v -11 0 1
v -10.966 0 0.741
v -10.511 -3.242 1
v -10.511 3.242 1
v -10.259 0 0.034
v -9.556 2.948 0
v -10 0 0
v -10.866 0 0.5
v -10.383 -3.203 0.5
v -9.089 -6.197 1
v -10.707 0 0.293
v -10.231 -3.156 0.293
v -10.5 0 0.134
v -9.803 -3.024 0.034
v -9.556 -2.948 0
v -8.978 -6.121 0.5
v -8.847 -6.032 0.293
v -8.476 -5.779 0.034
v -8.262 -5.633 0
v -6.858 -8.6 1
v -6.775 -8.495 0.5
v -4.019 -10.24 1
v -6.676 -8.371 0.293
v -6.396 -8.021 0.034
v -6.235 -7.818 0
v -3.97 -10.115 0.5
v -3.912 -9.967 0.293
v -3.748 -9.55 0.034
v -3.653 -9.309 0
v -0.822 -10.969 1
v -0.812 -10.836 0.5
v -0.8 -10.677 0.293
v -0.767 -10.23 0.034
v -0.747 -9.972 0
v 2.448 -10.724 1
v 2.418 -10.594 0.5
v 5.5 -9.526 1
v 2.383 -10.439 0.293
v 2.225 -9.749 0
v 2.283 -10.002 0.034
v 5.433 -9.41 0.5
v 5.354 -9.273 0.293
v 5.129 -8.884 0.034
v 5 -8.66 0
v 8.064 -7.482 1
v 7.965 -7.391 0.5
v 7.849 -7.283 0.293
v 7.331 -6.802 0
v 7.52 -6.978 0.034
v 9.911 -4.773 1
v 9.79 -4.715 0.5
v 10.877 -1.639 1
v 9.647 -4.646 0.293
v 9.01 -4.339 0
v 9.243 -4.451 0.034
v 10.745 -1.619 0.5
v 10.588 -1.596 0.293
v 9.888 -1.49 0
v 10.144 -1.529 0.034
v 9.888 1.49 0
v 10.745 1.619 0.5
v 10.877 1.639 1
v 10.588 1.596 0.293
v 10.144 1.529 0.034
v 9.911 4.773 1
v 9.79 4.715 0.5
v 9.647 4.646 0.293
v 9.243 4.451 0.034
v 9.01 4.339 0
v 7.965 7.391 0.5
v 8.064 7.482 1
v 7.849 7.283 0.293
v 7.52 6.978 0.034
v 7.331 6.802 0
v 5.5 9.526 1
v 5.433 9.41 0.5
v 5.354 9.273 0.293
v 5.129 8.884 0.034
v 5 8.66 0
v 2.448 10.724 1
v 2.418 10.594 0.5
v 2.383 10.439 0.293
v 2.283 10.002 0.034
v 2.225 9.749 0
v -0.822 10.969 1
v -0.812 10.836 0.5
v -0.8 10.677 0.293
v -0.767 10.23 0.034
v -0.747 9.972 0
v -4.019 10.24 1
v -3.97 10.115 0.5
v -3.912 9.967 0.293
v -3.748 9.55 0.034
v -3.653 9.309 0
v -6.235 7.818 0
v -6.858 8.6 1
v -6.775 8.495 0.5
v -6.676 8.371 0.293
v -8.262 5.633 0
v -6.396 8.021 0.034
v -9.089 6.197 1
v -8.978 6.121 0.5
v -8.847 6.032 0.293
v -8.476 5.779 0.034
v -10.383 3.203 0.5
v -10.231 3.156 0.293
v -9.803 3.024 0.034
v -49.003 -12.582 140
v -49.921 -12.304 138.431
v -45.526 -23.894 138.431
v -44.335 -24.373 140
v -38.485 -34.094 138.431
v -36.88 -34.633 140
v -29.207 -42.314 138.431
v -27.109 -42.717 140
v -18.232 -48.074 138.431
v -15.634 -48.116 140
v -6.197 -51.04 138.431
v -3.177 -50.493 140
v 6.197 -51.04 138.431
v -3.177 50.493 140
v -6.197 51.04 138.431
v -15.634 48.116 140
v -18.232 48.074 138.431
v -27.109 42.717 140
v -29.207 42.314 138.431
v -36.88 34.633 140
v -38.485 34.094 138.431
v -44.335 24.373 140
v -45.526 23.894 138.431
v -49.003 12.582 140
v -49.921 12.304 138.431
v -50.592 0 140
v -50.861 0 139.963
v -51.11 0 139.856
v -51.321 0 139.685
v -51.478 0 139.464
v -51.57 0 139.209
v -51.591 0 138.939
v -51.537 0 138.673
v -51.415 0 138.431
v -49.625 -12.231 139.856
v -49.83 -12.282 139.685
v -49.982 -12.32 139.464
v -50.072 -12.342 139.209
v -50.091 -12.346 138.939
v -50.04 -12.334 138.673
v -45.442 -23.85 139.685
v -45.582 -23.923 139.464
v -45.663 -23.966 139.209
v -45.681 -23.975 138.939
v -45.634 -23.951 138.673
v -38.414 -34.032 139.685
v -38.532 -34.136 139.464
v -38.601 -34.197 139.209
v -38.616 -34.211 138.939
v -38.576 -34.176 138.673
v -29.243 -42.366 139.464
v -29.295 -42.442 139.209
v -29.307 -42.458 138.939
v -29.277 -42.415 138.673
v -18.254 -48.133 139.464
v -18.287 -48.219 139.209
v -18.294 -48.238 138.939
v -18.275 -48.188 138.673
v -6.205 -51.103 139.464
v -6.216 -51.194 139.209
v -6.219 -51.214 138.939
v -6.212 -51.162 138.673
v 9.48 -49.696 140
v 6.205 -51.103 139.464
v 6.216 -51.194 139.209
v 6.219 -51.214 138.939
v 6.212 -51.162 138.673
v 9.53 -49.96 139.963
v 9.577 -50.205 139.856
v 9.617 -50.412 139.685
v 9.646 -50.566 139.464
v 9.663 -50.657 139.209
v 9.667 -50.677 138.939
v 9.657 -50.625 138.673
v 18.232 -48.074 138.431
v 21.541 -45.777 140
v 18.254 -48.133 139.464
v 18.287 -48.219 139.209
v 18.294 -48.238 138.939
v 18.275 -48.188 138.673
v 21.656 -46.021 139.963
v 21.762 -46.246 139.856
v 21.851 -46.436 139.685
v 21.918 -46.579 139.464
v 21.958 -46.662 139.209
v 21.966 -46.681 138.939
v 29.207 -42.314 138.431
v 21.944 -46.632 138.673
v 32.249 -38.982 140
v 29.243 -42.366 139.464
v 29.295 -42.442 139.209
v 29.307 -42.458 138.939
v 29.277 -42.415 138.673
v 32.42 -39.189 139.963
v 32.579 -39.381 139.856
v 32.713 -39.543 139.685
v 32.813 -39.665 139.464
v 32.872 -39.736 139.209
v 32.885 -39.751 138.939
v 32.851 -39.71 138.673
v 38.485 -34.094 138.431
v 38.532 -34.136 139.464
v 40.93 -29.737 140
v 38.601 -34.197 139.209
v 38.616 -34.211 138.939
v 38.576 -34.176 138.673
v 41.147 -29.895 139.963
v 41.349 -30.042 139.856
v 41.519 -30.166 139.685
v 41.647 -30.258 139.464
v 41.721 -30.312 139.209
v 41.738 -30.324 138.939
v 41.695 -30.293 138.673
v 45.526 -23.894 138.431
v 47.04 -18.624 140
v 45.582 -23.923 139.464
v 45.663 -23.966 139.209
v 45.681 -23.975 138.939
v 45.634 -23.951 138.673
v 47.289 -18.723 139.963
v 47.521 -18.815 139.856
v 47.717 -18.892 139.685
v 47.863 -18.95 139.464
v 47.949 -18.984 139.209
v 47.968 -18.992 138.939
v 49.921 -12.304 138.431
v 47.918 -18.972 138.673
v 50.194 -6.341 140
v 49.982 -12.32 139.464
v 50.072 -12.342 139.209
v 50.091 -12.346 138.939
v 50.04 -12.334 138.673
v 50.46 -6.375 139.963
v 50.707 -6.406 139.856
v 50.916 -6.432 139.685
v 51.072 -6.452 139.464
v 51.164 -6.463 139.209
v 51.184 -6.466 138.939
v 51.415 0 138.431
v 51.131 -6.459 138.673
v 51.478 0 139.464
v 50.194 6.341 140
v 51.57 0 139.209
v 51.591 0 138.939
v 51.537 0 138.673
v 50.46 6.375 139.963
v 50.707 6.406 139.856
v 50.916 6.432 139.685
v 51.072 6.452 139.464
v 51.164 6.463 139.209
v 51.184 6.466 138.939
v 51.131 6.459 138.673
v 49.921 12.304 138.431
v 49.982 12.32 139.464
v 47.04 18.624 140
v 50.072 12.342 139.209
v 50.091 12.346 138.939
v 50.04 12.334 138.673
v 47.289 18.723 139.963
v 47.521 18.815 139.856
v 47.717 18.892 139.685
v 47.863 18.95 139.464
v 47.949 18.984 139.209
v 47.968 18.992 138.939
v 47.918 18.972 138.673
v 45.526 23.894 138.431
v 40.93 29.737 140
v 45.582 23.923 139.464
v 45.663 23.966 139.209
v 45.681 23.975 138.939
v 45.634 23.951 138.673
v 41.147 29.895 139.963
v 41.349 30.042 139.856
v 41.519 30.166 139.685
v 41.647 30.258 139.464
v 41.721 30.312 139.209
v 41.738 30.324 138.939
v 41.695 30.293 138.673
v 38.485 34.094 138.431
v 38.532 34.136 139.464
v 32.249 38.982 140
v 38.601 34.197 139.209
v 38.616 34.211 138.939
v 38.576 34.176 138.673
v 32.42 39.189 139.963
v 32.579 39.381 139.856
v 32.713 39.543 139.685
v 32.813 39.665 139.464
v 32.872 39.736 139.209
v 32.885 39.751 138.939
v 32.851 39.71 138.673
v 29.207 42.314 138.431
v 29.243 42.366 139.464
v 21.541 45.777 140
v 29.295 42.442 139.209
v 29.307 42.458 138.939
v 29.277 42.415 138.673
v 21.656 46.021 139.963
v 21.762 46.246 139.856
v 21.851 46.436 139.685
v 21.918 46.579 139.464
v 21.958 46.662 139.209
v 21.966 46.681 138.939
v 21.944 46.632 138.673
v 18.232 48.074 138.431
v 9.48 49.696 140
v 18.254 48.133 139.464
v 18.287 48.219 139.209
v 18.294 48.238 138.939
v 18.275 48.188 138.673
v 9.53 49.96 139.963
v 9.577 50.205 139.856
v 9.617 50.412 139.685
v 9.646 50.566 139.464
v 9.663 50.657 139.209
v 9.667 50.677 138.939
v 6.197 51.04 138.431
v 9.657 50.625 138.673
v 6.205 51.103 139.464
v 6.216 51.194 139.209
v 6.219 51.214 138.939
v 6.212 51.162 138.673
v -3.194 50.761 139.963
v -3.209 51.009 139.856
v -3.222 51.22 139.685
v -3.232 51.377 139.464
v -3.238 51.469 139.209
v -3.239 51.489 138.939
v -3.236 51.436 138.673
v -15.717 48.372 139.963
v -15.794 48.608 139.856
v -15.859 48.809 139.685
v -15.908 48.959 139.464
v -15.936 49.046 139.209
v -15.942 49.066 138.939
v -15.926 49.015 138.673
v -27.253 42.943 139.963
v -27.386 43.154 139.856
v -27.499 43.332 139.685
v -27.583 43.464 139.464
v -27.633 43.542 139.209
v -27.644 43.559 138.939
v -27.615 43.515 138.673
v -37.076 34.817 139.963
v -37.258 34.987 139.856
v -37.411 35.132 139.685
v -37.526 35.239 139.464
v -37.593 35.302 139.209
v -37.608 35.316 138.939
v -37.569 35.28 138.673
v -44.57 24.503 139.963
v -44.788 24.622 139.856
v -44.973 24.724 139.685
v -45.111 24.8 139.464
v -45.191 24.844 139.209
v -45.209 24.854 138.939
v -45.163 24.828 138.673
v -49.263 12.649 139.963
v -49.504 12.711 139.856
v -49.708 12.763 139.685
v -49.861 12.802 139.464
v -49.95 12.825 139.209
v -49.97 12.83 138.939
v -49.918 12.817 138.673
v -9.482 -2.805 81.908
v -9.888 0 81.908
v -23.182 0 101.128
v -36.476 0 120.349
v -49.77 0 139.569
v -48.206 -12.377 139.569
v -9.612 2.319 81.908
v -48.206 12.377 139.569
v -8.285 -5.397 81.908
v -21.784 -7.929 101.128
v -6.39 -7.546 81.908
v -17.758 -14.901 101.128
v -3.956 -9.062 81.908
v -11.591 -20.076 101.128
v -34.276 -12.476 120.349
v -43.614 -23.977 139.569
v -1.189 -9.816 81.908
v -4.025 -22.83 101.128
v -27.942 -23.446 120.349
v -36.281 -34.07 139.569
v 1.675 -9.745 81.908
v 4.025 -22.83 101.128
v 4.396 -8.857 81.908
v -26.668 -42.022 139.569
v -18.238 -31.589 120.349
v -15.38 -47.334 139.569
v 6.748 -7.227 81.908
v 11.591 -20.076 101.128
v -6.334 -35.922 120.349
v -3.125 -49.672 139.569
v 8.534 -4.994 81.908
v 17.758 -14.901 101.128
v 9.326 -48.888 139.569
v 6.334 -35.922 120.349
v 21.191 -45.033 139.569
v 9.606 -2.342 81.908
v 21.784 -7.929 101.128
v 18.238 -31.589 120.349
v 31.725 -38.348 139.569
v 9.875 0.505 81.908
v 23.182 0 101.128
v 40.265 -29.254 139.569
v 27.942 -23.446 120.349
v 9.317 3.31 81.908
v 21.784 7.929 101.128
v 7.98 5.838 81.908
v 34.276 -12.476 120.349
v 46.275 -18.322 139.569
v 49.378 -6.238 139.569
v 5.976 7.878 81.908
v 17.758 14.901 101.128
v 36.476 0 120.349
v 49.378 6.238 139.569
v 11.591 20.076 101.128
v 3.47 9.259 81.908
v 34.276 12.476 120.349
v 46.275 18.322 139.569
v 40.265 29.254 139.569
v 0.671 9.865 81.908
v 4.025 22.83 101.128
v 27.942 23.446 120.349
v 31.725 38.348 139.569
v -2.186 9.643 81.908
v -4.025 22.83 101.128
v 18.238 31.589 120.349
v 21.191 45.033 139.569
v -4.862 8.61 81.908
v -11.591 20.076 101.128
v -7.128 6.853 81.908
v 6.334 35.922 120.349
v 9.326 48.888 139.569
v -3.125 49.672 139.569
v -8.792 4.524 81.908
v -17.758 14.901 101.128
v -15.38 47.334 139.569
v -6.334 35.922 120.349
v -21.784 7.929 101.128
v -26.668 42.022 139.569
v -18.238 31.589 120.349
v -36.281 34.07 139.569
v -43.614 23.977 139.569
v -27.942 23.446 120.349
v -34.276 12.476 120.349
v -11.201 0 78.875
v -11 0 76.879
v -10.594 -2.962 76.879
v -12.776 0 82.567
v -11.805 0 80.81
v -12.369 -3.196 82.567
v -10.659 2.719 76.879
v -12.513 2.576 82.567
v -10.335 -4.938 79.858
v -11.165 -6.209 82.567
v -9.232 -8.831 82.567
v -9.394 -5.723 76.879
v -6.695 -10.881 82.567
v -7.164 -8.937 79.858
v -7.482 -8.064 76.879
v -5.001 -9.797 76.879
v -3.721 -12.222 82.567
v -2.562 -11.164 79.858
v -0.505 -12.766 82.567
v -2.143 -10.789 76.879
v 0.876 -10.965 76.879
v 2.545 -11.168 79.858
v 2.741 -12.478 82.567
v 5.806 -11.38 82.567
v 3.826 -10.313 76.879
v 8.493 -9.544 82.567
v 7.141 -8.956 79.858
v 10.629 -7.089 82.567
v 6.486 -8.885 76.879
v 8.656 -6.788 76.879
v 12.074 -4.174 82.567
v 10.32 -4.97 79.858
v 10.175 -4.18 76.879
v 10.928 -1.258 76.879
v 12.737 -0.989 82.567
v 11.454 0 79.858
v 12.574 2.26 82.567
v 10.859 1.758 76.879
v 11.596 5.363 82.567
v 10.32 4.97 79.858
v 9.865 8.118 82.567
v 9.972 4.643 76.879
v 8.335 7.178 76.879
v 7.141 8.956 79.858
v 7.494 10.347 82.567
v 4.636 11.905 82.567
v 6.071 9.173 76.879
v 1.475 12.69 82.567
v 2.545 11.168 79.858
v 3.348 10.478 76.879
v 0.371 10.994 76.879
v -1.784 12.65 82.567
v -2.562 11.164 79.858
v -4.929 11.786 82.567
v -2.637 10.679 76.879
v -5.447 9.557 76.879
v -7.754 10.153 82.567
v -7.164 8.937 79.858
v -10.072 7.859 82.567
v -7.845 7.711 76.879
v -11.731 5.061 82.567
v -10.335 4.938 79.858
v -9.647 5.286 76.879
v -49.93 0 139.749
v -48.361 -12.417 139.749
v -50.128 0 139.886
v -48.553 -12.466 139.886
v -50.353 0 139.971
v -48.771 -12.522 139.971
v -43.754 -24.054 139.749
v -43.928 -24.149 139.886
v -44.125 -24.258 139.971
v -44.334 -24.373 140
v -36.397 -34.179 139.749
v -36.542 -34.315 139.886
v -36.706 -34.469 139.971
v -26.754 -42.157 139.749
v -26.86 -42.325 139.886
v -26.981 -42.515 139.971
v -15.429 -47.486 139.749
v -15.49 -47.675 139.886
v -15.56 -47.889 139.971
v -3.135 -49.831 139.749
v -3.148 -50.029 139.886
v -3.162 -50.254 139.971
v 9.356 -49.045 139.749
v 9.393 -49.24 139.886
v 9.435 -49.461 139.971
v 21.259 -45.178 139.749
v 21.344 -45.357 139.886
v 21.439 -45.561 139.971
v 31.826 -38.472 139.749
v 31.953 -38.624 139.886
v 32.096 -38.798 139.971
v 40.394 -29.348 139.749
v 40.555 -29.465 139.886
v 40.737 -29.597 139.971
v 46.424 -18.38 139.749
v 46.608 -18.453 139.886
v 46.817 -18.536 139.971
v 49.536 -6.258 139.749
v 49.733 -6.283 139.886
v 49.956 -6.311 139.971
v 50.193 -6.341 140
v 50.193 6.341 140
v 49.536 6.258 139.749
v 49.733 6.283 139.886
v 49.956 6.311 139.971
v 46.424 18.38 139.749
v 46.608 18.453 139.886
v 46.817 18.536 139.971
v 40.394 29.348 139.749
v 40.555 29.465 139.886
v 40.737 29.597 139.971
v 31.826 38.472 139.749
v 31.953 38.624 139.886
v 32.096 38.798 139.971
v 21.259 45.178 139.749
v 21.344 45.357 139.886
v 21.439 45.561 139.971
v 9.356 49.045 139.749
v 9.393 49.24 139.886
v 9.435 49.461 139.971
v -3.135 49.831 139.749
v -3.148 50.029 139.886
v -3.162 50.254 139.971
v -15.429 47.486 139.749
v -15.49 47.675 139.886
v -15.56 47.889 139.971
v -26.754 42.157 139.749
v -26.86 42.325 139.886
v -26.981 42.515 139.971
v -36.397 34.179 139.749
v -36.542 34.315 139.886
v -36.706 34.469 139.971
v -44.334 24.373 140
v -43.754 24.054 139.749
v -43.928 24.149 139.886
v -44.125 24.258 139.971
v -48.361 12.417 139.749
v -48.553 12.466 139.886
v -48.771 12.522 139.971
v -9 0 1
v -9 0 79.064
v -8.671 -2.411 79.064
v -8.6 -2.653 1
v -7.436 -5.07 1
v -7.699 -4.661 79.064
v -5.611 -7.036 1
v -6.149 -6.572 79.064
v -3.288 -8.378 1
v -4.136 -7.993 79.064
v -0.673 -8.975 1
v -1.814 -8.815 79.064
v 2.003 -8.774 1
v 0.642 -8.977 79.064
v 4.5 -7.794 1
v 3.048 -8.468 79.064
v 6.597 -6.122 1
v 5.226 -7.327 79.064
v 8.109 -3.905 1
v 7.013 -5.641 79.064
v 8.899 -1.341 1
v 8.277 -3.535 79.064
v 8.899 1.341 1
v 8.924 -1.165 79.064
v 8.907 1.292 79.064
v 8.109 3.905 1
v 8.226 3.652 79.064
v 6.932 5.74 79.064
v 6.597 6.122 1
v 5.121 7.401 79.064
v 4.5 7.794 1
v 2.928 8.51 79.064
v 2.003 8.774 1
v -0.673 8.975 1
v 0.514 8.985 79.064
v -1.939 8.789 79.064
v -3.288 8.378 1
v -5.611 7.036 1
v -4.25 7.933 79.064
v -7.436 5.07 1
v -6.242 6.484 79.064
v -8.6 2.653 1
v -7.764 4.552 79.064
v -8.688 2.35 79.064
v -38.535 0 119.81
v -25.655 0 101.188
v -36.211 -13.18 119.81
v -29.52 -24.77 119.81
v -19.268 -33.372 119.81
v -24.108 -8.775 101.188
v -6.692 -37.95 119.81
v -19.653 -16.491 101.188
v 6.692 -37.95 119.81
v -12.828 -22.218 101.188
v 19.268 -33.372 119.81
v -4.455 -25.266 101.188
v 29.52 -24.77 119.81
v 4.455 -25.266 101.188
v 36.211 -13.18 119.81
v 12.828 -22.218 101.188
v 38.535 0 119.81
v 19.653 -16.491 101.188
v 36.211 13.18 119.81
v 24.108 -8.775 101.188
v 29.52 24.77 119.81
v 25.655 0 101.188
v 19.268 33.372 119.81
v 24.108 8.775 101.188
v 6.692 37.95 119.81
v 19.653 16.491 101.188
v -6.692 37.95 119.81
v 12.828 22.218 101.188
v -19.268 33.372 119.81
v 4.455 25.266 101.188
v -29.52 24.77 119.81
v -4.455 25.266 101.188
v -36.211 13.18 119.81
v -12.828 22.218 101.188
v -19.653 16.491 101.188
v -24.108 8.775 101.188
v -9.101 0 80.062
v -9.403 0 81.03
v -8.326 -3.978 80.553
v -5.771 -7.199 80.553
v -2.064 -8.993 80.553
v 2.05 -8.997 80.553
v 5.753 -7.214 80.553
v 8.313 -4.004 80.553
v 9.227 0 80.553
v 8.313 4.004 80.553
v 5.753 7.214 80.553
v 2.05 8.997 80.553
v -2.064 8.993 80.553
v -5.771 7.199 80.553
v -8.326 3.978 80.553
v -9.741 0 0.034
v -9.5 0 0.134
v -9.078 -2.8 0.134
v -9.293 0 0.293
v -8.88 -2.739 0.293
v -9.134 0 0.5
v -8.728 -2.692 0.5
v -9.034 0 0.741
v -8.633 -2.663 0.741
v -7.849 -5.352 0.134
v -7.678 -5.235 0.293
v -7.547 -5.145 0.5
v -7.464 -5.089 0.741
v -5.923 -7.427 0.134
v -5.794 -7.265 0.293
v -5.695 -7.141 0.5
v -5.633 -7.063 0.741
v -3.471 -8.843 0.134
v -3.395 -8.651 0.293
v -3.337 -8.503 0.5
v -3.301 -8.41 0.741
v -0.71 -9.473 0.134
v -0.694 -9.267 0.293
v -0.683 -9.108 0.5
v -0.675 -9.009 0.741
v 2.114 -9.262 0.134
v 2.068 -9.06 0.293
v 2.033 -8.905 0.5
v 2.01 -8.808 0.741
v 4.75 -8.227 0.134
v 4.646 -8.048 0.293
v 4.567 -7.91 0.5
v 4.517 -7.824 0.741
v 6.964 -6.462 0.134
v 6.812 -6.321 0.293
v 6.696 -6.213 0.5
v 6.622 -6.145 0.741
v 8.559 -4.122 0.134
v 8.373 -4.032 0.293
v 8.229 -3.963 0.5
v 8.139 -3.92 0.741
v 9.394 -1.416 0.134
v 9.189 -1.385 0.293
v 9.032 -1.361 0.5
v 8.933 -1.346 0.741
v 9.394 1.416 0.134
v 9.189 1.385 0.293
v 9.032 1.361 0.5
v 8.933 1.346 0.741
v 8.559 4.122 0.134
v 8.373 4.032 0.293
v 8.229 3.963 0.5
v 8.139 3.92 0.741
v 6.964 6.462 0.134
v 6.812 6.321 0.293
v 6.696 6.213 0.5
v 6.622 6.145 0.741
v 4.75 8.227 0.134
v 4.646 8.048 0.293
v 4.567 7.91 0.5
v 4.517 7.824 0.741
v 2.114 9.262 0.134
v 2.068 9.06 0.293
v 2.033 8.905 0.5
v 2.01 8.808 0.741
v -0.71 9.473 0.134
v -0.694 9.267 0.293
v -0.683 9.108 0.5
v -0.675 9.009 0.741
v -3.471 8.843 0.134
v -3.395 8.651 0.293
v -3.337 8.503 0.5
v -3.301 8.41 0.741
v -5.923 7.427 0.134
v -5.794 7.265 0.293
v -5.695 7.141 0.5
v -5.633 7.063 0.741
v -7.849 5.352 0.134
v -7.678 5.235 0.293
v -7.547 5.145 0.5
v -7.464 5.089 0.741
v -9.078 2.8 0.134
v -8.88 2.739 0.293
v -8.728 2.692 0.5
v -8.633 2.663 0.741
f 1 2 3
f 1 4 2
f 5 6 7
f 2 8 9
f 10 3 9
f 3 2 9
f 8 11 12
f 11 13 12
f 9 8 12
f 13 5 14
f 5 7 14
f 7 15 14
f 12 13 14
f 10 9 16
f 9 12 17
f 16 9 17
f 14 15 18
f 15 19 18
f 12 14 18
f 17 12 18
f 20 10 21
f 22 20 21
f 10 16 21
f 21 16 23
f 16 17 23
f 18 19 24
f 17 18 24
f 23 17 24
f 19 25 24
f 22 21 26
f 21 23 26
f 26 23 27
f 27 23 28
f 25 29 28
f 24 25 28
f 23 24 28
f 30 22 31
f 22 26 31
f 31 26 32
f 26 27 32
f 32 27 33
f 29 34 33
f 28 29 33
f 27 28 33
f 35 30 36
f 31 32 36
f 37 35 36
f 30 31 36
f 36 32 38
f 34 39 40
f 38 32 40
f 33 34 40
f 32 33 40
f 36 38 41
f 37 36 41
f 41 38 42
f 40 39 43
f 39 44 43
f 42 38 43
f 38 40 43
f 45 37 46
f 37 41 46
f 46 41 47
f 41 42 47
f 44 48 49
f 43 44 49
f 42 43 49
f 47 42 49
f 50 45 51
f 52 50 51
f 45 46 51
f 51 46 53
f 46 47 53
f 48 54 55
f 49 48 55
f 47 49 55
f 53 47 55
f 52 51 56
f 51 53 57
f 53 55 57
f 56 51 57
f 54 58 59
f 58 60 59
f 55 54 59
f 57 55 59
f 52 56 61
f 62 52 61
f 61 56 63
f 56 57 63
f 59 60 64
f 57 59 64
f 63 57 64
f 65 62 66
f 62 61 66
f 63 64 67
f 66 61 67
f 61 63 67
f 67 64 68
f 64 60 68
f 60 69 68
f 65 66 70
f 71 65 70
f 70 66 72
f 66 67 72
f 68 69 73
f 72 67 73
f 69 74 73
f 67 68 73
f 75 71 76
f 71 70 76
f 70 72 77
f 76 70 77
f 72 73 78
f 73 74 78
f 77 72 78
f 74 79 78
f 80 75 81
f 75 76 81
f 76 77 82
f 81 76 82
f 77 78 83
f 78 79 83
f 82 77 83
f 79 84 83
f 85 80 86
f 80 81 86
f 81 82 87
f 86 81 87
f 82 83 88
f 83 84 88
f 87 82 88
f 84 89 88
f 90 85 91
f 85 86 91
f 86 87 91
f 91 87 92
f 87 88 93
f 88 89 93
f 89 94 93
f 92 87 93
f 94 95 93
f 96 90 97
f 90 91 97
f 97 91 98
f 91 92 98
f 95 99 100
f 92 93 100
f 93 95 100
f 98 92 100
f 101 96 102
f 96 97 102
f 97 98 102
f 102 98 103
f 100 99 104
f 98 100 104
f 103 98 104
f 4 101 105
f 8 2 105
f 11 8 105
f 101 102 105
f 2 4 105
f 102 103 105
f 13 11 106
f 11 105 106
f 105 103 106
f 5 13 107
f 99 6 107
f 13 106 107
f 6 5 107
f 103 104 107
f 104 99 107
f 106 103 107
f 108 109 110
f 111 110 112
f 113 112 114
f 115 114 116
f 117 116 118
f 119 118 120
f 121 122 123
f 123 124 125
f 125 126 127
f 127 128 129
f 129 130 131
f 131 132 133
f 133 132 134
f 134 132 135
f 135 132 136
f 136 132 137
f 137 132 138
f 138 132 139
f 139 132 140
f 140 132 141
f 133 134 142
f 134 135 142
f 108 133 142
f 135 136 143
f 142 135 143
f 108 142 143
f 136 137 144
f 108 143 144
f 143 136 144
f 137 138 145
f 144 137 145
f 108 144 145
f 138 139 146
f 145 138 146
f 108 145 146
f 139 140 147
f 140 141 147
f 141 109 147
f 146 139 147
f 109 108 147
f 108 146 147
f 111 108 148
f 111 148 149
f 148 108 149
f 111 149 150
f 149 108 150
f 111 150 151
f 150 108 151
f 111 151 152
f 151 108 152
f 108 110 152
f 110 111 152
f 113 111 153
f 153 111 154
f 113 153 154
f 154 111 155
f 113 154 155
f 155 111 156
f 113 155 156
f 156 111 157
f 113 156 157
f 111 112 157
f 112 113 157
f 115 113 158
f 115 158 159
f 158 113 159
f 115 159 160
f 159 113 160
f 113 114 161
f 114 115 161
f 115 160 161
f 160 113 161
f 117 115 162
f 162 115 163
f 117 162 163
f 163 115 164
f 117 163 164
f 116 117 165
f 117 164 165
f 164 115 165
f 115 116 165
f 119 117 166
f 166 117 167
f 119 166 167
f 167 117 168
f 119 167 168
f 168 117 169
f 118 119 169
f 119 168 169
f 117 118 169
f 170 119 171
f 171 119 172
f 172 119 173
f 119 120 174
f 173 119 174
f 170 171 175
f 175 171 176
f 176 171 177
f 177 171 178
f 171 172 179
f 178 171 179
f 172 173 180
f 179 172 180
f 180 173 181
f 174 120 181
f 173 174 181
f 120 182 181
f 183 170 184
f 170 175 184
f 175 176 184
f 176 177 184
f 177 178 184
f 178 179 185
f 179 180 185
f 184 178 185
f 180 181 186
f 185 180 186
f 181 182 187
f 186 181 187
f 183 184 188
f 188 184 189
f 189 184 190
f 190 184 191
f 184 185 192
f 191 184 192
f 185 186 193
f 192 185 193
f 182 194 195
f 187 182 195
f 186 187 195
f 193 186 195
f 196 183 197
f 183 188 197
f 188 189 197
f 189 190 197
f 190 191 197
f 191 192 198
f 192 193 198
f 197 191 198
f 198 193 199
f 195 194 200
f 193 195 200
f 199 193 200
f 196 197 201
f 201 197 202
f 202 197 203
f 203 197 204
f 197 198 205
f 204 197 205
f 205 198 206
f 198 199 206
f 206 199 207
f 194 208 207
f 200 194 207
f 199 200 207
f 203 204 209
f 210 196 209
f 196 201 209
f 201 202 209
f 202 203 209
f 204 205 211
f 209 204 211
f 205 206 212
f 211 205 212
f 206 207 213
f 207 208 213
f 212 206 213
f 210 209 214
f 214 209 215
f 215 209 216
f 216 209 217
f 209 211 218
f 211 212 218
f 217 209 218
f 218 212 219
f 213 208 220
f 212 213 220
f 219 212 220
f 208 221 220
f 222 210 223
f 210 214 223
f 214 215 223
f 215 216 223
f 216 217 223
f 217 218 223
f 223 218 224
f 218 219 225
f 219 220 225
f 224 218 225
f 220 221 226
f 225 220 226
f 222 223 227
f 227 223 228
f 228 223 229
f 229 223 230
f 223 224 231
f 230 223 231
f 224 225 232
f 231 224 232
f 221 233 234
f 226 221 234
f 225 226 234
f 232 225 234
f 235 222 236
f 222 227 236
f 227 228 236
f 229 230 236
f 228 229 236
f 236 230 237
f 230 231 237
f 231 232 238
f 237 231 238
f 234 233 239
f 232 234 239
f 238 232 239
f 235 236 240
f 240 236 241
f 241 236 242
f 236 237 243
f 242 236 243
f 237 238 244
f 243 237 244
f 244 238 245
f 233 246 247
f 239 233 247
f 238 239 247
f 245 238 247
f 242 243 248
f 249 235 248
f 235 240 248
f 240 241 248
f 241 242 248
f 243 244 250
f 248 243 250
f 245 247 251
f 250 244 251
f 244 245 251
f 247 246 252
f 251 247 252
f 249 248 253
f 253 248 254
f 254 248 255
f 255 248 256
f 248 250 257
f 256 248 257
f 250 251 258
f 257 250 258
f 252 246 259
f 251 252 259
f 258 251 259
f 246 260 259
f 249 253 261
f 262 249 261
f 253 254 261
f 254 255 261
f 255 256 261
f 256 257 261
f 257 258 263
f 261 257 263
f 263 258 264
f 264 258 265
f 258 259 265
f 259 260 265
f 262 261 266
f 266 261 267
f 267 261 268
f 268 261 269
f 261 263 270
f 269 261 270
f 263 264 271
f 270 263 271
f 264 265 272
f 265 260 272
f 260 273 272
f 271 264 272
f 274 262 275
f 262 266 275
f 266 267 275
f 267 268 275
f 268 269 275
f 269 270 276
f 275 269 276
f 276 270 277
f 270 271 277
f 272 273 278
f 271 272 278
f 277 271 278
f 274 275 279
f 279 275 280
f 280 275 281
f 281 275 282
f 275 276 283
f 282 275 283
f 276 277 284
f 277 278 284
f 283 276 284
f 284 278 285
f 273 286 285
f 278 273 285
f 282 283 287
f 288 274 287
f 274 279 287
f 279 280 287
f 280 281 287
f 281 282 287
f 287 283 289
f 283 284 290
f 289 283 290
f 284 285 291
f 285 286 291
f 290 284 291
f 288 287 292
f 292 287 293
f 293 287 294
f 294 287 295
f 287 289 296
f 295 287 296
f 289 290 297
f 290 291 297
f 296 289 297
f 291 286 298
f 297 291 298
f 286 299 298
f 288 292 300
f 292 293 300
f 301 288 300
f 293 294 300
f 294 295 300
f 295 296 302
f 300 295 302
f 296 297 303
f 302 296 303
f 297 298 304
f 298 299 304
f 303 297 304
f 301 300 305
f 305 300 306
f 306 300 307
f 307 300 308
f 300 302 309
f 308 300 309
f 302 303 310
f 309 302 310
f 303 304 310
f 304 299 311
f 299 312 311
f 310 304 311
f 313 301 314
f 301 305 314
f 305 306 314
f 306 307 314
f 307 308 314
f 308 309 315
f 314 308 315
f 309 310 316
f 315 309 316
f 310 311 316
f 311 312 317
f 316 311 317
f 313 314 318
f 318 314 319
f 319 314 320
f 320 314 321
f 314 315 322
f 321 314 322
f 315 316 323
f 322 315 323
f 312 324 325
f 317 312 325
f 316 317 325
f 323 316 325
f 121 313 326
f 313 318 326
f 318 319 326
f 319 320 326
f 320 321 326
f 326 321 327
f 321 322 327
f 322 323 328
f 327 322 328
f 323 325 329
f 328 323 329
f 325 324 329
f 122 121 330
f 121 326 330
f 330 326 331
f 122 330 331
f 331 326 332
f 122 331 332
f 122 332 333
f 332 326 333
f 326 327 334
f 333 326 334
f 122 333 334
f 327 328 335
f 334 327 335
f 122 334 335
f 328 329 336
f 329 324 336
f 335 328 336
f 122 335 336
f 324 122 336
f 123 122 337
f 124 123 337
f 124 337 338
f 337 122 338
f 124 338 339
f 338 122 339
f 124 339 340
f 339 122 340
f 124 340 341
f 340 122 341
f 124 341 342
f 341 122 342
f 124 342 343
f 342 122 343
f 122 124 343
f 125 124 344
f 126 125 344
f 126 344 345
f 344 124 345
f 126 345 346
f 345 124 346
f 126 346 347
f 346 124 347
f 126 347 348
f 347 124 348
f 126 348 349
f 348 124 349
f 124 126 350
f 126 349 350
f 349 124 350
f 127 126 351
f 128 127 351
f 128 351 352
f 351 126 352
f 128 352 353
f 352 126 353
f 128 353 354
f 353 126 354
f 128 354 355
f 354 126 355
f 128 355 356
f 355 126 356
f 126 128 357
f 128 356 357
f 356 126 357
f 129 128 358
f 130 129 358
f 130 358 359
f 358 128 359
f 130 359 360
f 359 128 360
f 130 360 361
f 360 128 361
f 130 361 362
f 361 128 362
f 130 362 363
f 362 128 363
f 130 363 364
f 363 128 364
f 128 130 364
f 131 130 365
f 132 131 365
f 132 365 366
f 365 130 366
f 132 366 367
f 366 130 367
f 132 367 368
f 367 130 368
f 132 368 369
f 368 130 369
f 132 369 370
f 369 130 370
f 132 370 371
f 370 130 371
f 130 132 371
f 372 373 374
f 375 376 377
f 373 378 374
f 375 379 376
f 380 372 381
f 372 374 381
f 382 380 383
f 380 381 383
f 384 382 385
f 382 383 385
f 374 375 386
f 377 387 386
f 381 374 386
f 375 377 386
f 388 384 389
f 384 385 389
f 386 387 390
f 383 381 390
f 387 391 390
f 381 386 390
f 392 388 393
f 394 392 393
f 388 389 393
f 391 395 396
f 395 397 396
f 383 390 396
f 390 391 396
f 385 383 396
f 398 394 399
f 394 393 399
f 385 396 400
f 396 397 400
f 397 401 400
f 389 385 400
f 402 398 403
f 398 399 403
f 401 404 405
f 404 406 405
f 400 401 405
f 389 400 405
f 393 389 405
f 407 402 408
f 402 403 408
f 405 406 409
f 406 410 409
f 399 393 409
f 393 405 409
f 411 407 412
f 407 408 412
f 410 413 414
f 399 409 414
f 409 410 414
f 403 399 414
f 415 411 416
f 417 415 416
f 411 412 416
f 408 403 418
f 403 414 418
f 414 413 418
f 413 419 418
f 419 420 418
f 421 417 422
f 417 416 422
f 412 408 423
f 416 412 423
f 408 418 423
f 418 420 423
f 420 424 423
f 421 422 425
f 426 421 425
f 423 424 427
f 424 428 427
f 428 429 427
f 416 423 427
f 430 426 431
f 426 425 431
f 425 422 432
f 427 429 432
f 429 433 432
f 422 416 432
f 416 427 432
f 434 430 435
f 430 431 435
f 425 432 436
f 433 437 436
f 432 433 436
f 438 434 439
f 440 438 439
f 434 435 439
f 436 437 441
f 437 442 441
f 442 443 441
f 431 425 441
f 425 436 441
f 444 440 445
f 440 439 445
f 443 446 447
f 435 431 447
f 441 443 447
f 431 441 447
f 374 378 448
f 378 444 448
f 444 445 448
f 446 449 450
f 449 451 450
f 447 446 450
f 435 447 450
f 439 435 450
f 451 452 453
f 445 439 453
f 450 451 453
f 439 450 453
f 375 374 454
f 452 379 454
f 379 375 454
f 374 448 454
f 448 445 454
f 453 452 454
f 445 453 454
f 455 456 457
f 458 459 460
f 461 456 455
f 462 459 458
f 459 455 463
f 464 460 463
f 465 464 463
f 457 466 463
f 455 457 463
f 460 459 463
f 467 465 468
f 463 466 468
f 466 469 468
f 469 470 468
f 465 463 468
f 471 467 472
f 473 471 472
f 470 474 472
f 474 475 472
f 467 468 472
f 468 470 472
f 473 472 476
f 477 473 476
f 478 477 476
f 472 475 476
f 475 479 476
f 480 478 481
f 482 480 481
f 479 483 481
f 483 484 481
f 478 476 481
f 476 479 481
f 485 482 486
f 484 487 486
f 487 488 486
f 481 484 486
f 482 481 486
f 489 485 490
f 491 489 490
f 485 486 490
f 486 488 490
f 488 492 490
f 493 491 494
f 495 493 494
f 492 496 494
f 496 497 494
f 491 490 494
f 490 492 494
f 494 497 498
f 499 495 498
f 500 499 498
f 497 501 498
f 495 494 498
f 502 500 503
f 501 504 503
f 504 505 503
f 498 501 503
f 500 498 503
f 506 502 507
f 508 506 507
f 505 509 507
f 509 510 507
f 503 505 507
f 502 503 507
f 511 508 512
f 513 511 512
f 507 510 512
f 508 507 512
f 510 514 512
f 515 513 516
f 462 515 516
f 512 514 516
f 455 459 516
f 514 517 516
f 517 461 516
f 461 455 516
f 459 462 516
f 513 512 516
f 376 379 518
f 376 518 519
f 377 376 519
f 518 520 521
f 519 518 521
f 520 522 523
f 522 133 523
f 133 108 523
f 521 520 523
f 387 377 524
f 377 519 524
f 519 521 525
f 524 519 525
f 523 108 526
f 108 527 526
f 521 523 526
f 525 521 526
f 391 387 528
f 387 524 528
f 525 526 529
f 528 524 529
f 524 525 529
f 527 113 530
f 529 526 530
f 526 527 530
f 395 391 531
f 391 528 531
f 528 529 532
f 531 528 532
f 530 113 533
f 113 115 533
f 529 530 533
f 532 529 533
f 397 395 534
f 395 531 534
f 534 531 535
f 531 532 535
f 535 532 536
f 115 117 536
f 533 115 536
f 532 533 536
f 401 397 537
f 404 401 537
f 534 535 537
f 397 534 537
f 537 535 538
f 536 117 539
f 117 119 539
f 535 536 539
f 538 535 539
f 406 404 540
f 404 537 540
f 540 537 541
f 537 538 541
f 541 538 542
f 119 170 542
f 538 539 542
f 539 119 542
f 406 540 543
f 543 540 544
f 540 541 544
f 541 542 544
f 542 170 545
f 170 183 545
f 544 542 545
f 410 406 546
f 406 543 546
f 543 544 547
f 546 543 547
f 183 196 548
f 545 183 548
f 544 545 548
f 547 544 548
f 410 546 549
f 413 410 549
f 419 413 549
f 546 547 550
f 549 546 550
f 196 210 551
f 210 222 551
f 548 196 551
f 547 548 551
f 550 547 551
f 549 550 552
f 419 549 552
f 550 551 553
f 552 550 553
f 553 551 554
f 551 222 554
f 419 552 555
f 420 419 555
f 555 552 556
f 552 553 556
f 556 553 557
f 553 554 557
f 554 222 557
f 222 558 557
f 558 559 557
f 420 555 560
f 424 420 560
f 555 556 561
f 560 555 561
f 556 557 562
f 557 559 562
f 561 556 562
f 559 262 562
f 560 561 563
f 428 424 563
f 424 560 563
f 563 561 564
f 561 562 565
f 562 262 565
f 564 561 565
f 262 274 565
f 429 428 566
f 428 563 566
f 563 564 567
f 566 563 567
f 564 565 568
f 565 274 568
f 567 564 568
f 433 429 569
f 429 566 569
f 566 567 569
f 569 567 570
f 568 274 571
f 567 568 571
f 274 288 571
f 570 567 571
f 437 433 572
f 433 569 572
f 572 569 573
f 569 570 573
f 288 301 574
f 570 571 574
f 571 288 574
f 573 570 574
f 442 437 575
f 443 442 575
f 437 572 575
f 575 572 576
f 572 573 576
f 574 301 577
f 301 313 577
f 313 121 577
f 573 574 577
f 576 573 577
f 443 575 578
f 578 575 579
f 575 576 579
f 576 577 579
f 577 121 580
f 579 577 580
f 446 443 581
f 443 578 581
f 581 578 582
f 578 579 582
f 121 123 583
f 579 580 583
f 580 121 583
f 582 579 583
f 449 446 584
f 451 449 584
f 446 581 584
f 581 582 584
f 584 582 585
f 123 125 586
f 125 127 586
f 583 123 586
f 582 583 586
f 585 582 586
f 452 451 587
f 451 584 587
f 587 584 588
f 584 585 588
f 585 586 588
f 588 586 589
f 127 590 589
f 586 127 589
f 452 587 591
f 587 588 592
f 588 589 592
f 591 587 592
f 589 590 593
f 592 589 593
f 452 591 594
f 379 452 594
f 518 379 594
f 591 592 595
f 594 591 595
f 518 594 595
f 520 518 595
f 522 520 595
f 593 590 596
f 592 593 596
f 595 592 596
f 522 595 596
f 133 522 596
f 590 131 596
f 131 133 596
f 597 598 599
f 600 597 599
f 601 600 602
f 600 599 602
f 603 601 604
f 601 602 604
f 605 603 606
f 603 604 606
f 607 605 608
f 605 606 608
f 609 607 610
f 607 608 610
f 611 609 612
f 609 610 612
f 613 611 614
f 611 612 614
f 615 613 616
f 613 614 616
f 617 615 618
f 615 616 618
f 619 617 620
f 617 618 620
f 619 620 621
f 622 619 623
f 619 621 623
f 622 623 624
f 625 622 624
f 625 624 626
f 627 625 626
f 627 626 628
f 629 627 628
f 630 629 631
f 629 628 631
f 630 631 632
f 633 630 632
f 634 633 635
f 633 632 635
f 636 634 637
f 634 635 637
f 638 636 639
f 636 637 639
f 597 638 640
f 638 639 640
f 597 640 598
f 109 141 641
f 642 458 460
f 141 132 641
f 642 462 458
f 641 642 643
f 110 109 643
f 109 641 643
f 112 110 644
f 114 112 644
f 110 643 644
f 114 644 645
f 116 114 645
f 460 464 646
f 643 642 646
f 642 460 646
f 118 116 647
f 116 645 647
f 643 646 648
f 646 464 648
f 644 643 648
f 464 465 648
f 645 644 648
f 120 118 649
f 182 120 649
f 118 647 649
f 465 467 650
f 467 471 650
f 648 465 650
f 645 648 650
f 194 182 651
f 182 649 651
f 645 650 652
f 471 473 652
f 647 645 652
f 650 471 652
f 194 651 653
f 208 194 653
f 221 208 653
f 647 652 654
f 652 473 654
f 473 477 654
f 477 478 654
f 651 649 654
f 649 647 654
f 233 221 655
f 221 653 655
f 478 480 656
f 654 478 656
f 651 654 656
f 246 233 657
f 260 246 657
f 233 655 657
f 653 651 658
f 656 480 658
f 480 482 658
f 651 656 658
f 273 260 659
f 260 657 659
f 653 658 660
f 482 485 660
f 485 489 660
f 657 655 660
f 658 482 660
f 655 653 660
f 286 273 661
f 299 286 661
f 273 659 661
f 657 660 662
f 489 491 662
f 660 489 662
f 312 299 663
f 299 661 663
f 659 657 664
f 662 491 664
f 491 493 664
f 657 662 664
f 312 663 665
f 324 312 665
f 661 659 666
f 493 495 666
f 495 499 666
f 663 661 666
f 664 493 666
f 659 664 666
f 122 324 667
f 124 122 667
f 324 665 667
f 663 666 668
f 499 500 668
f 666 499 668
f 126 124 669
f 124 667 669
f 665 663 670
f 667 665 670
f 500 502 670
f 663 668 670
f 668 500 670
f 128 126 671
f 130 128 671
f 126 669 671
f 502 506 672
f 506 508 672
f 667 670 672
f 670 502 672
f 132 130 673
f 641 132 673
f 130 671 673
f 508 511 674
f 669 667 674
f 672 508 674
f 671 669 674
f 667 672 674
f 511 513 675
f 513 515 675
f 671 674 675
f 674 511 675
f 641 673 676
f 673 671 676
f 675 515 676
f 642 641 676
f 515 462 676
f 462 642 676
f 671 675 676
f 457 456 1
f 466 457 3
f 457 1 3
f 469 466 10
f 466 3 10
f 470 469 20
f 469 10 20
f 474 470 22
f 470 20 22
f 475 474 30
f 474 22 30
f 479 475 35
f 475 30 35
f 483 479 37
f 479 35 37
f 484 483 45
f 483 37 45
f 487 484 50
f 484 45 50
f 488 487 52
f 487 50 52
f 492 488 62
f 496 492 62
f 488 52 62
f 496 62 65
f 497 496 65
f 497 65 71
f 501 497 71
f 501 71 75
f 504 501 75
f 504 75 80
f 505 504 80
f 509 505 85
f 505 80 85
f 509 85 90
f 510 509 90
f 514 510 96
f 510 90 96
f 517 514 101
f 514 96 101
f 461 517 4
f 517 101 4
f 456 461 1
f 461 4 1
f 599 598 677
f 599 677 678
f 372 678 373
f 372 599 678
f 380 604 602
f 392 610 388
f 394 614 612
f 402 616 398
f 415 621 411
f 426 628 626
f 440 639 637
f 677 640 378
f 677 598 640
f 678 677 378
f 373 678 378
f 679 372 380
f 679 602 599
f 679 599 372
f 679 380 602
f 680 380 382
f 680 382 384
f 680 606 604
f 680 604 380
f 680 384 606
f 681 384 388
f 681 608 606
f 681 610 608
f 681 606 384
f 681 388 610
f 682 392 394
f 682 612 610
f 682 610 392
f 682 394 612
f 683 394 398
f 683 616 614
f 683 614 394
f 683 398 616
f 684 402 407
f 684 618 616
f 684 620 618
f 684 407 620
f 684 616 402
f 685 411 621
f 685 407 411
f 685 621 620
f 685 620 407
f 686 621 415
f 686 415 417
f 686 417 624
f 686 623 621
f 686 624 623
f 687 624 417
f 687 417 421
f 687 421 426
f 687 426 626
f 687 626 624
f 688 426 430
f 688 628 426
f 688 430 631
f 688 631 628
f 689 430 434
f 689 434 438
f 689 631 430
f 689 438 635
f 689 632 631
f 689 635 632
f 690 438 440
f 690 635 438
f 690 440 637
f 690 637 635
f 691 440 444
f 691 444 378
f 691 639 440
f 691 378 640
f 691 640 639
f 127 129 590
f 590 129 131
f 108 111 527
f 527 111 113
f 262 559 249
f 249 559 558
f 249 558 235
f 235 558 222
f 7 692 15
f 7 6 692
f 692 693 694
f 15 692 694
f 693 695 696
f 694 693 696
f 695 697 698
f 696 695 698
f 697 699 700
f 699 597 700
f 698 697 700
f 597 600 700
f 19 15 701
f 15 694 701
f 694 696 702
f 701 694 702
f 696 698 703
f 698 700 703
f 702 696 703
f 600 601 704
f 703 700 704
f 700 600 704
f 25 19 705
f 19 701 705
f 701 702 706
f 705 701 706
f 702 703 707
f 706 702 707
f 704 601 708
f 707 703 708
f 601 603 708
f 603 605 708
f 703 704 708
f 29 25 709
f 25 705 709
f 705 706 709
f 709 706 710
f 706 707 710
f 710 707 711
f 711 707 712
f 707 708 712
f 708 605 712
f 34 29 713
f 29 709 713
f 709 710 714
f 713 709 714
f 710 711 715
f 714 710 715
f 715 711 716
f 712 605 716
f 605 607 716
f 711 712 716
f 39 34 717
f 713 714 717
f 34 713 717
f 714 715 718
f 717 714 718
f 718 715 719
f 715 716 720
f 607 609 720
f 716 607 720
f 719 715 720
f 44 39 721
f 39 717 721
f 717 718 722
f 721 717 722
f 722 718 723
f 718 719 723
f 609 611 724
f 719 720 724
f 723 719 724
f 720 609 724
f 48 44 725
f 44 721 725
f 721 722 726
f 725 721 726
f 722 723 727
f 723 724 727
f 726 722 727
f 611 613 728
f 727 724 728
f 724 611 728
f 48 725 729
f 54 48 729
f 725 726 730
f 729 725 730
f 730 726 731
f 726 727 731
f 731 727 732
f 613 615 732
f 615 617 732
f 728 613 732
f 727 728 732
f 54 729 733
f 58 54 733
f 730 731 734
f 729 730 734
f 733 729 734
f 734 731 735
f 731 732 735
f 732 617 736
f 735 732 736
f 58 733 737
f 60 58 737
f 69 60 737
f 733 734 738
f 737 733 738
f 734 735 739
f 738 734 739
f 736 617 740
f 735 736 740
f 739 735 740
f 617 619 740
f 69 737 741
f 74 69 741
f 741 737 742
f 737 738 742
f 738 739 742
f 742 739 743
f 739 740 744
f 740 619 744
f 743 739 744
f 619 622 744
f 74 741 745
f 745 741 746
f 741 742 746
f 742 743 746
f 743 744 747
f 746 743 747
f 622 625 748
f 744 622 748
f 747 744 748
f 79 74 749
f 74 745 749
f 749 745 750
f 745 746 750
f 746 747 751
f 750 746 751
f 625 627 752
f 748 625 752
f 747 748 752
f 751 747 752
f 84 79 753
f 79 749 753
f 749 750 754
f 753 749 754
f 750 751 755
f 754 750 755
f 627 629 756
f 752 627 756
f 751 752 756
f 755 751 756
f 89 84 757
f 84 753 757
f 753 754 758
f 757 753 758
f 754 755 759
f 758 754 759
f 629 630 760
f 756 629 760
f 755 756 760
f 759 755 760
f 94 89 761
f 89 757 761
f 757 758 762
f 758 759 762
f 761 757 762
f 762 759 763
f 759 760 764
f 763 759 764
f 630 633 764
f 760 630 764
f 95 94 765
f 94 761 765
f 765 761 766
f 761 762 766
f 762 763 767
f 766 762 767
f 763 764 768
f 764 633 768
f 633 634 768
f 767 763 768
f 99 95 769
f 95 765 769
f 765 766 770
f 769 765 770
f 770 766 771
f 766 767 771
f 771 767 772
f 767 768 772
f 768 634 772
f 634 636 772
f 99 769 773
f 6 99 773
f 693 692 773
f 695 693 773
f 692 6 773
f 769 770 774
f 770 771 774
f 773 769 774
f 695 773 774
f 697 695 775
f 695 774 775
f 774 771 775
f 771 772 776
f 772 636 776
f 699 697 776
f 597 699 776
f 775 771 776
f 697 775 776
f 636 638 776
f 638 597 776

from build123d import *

# Parameters (mm, degrees)
F2_R = 0.99999
F3_R = 5
F4_R = 10


# Not quite as in the source:
# - a fillet or chamfer is up to 0.001 mm smaller than in the source, because OpenCascade refuses the exact size


with BuildPart() as f1:
    # F0 (on Front) → F1 (revolve)
    with BuildSketch(Plane.XZ):
        Polygon((-11, 80), (-11, 0), (-9, 0), (-9, 80.6242772277), (-50.0682082509, 140), (-52.5, 140), align=None)
    revolve(axis=Axis((0, 0, 40), (0, 0, 1)))

    # F2 (radius 1 in the source; OpenCascade refuses exactly that, so slightly less here)
    f2_edges = [f1.edges().sort_by_distance(p)[0] for p in [
        (52.5, 0, 140),
        (50.068208, 0, 140),
        (11, 0, 0),
        (9, 0, 0),
    ]]
    fillet(f2_edges, radius=F2_R)

    # F3
    f3_edges = [f1.edges().sort_by_distance(p)[0] for p in [
        (9, 0, 80.624277),
    ]]
    fillet(f3_edges, radius=F3_R)

    # F4
    f4_edges = [f1.edges().sort_by_distance(p)[0] for p in [
        (11, 0, 80),
    ]]
    fillet(f4_edges, radius=F4_R)


solid = f1.part
